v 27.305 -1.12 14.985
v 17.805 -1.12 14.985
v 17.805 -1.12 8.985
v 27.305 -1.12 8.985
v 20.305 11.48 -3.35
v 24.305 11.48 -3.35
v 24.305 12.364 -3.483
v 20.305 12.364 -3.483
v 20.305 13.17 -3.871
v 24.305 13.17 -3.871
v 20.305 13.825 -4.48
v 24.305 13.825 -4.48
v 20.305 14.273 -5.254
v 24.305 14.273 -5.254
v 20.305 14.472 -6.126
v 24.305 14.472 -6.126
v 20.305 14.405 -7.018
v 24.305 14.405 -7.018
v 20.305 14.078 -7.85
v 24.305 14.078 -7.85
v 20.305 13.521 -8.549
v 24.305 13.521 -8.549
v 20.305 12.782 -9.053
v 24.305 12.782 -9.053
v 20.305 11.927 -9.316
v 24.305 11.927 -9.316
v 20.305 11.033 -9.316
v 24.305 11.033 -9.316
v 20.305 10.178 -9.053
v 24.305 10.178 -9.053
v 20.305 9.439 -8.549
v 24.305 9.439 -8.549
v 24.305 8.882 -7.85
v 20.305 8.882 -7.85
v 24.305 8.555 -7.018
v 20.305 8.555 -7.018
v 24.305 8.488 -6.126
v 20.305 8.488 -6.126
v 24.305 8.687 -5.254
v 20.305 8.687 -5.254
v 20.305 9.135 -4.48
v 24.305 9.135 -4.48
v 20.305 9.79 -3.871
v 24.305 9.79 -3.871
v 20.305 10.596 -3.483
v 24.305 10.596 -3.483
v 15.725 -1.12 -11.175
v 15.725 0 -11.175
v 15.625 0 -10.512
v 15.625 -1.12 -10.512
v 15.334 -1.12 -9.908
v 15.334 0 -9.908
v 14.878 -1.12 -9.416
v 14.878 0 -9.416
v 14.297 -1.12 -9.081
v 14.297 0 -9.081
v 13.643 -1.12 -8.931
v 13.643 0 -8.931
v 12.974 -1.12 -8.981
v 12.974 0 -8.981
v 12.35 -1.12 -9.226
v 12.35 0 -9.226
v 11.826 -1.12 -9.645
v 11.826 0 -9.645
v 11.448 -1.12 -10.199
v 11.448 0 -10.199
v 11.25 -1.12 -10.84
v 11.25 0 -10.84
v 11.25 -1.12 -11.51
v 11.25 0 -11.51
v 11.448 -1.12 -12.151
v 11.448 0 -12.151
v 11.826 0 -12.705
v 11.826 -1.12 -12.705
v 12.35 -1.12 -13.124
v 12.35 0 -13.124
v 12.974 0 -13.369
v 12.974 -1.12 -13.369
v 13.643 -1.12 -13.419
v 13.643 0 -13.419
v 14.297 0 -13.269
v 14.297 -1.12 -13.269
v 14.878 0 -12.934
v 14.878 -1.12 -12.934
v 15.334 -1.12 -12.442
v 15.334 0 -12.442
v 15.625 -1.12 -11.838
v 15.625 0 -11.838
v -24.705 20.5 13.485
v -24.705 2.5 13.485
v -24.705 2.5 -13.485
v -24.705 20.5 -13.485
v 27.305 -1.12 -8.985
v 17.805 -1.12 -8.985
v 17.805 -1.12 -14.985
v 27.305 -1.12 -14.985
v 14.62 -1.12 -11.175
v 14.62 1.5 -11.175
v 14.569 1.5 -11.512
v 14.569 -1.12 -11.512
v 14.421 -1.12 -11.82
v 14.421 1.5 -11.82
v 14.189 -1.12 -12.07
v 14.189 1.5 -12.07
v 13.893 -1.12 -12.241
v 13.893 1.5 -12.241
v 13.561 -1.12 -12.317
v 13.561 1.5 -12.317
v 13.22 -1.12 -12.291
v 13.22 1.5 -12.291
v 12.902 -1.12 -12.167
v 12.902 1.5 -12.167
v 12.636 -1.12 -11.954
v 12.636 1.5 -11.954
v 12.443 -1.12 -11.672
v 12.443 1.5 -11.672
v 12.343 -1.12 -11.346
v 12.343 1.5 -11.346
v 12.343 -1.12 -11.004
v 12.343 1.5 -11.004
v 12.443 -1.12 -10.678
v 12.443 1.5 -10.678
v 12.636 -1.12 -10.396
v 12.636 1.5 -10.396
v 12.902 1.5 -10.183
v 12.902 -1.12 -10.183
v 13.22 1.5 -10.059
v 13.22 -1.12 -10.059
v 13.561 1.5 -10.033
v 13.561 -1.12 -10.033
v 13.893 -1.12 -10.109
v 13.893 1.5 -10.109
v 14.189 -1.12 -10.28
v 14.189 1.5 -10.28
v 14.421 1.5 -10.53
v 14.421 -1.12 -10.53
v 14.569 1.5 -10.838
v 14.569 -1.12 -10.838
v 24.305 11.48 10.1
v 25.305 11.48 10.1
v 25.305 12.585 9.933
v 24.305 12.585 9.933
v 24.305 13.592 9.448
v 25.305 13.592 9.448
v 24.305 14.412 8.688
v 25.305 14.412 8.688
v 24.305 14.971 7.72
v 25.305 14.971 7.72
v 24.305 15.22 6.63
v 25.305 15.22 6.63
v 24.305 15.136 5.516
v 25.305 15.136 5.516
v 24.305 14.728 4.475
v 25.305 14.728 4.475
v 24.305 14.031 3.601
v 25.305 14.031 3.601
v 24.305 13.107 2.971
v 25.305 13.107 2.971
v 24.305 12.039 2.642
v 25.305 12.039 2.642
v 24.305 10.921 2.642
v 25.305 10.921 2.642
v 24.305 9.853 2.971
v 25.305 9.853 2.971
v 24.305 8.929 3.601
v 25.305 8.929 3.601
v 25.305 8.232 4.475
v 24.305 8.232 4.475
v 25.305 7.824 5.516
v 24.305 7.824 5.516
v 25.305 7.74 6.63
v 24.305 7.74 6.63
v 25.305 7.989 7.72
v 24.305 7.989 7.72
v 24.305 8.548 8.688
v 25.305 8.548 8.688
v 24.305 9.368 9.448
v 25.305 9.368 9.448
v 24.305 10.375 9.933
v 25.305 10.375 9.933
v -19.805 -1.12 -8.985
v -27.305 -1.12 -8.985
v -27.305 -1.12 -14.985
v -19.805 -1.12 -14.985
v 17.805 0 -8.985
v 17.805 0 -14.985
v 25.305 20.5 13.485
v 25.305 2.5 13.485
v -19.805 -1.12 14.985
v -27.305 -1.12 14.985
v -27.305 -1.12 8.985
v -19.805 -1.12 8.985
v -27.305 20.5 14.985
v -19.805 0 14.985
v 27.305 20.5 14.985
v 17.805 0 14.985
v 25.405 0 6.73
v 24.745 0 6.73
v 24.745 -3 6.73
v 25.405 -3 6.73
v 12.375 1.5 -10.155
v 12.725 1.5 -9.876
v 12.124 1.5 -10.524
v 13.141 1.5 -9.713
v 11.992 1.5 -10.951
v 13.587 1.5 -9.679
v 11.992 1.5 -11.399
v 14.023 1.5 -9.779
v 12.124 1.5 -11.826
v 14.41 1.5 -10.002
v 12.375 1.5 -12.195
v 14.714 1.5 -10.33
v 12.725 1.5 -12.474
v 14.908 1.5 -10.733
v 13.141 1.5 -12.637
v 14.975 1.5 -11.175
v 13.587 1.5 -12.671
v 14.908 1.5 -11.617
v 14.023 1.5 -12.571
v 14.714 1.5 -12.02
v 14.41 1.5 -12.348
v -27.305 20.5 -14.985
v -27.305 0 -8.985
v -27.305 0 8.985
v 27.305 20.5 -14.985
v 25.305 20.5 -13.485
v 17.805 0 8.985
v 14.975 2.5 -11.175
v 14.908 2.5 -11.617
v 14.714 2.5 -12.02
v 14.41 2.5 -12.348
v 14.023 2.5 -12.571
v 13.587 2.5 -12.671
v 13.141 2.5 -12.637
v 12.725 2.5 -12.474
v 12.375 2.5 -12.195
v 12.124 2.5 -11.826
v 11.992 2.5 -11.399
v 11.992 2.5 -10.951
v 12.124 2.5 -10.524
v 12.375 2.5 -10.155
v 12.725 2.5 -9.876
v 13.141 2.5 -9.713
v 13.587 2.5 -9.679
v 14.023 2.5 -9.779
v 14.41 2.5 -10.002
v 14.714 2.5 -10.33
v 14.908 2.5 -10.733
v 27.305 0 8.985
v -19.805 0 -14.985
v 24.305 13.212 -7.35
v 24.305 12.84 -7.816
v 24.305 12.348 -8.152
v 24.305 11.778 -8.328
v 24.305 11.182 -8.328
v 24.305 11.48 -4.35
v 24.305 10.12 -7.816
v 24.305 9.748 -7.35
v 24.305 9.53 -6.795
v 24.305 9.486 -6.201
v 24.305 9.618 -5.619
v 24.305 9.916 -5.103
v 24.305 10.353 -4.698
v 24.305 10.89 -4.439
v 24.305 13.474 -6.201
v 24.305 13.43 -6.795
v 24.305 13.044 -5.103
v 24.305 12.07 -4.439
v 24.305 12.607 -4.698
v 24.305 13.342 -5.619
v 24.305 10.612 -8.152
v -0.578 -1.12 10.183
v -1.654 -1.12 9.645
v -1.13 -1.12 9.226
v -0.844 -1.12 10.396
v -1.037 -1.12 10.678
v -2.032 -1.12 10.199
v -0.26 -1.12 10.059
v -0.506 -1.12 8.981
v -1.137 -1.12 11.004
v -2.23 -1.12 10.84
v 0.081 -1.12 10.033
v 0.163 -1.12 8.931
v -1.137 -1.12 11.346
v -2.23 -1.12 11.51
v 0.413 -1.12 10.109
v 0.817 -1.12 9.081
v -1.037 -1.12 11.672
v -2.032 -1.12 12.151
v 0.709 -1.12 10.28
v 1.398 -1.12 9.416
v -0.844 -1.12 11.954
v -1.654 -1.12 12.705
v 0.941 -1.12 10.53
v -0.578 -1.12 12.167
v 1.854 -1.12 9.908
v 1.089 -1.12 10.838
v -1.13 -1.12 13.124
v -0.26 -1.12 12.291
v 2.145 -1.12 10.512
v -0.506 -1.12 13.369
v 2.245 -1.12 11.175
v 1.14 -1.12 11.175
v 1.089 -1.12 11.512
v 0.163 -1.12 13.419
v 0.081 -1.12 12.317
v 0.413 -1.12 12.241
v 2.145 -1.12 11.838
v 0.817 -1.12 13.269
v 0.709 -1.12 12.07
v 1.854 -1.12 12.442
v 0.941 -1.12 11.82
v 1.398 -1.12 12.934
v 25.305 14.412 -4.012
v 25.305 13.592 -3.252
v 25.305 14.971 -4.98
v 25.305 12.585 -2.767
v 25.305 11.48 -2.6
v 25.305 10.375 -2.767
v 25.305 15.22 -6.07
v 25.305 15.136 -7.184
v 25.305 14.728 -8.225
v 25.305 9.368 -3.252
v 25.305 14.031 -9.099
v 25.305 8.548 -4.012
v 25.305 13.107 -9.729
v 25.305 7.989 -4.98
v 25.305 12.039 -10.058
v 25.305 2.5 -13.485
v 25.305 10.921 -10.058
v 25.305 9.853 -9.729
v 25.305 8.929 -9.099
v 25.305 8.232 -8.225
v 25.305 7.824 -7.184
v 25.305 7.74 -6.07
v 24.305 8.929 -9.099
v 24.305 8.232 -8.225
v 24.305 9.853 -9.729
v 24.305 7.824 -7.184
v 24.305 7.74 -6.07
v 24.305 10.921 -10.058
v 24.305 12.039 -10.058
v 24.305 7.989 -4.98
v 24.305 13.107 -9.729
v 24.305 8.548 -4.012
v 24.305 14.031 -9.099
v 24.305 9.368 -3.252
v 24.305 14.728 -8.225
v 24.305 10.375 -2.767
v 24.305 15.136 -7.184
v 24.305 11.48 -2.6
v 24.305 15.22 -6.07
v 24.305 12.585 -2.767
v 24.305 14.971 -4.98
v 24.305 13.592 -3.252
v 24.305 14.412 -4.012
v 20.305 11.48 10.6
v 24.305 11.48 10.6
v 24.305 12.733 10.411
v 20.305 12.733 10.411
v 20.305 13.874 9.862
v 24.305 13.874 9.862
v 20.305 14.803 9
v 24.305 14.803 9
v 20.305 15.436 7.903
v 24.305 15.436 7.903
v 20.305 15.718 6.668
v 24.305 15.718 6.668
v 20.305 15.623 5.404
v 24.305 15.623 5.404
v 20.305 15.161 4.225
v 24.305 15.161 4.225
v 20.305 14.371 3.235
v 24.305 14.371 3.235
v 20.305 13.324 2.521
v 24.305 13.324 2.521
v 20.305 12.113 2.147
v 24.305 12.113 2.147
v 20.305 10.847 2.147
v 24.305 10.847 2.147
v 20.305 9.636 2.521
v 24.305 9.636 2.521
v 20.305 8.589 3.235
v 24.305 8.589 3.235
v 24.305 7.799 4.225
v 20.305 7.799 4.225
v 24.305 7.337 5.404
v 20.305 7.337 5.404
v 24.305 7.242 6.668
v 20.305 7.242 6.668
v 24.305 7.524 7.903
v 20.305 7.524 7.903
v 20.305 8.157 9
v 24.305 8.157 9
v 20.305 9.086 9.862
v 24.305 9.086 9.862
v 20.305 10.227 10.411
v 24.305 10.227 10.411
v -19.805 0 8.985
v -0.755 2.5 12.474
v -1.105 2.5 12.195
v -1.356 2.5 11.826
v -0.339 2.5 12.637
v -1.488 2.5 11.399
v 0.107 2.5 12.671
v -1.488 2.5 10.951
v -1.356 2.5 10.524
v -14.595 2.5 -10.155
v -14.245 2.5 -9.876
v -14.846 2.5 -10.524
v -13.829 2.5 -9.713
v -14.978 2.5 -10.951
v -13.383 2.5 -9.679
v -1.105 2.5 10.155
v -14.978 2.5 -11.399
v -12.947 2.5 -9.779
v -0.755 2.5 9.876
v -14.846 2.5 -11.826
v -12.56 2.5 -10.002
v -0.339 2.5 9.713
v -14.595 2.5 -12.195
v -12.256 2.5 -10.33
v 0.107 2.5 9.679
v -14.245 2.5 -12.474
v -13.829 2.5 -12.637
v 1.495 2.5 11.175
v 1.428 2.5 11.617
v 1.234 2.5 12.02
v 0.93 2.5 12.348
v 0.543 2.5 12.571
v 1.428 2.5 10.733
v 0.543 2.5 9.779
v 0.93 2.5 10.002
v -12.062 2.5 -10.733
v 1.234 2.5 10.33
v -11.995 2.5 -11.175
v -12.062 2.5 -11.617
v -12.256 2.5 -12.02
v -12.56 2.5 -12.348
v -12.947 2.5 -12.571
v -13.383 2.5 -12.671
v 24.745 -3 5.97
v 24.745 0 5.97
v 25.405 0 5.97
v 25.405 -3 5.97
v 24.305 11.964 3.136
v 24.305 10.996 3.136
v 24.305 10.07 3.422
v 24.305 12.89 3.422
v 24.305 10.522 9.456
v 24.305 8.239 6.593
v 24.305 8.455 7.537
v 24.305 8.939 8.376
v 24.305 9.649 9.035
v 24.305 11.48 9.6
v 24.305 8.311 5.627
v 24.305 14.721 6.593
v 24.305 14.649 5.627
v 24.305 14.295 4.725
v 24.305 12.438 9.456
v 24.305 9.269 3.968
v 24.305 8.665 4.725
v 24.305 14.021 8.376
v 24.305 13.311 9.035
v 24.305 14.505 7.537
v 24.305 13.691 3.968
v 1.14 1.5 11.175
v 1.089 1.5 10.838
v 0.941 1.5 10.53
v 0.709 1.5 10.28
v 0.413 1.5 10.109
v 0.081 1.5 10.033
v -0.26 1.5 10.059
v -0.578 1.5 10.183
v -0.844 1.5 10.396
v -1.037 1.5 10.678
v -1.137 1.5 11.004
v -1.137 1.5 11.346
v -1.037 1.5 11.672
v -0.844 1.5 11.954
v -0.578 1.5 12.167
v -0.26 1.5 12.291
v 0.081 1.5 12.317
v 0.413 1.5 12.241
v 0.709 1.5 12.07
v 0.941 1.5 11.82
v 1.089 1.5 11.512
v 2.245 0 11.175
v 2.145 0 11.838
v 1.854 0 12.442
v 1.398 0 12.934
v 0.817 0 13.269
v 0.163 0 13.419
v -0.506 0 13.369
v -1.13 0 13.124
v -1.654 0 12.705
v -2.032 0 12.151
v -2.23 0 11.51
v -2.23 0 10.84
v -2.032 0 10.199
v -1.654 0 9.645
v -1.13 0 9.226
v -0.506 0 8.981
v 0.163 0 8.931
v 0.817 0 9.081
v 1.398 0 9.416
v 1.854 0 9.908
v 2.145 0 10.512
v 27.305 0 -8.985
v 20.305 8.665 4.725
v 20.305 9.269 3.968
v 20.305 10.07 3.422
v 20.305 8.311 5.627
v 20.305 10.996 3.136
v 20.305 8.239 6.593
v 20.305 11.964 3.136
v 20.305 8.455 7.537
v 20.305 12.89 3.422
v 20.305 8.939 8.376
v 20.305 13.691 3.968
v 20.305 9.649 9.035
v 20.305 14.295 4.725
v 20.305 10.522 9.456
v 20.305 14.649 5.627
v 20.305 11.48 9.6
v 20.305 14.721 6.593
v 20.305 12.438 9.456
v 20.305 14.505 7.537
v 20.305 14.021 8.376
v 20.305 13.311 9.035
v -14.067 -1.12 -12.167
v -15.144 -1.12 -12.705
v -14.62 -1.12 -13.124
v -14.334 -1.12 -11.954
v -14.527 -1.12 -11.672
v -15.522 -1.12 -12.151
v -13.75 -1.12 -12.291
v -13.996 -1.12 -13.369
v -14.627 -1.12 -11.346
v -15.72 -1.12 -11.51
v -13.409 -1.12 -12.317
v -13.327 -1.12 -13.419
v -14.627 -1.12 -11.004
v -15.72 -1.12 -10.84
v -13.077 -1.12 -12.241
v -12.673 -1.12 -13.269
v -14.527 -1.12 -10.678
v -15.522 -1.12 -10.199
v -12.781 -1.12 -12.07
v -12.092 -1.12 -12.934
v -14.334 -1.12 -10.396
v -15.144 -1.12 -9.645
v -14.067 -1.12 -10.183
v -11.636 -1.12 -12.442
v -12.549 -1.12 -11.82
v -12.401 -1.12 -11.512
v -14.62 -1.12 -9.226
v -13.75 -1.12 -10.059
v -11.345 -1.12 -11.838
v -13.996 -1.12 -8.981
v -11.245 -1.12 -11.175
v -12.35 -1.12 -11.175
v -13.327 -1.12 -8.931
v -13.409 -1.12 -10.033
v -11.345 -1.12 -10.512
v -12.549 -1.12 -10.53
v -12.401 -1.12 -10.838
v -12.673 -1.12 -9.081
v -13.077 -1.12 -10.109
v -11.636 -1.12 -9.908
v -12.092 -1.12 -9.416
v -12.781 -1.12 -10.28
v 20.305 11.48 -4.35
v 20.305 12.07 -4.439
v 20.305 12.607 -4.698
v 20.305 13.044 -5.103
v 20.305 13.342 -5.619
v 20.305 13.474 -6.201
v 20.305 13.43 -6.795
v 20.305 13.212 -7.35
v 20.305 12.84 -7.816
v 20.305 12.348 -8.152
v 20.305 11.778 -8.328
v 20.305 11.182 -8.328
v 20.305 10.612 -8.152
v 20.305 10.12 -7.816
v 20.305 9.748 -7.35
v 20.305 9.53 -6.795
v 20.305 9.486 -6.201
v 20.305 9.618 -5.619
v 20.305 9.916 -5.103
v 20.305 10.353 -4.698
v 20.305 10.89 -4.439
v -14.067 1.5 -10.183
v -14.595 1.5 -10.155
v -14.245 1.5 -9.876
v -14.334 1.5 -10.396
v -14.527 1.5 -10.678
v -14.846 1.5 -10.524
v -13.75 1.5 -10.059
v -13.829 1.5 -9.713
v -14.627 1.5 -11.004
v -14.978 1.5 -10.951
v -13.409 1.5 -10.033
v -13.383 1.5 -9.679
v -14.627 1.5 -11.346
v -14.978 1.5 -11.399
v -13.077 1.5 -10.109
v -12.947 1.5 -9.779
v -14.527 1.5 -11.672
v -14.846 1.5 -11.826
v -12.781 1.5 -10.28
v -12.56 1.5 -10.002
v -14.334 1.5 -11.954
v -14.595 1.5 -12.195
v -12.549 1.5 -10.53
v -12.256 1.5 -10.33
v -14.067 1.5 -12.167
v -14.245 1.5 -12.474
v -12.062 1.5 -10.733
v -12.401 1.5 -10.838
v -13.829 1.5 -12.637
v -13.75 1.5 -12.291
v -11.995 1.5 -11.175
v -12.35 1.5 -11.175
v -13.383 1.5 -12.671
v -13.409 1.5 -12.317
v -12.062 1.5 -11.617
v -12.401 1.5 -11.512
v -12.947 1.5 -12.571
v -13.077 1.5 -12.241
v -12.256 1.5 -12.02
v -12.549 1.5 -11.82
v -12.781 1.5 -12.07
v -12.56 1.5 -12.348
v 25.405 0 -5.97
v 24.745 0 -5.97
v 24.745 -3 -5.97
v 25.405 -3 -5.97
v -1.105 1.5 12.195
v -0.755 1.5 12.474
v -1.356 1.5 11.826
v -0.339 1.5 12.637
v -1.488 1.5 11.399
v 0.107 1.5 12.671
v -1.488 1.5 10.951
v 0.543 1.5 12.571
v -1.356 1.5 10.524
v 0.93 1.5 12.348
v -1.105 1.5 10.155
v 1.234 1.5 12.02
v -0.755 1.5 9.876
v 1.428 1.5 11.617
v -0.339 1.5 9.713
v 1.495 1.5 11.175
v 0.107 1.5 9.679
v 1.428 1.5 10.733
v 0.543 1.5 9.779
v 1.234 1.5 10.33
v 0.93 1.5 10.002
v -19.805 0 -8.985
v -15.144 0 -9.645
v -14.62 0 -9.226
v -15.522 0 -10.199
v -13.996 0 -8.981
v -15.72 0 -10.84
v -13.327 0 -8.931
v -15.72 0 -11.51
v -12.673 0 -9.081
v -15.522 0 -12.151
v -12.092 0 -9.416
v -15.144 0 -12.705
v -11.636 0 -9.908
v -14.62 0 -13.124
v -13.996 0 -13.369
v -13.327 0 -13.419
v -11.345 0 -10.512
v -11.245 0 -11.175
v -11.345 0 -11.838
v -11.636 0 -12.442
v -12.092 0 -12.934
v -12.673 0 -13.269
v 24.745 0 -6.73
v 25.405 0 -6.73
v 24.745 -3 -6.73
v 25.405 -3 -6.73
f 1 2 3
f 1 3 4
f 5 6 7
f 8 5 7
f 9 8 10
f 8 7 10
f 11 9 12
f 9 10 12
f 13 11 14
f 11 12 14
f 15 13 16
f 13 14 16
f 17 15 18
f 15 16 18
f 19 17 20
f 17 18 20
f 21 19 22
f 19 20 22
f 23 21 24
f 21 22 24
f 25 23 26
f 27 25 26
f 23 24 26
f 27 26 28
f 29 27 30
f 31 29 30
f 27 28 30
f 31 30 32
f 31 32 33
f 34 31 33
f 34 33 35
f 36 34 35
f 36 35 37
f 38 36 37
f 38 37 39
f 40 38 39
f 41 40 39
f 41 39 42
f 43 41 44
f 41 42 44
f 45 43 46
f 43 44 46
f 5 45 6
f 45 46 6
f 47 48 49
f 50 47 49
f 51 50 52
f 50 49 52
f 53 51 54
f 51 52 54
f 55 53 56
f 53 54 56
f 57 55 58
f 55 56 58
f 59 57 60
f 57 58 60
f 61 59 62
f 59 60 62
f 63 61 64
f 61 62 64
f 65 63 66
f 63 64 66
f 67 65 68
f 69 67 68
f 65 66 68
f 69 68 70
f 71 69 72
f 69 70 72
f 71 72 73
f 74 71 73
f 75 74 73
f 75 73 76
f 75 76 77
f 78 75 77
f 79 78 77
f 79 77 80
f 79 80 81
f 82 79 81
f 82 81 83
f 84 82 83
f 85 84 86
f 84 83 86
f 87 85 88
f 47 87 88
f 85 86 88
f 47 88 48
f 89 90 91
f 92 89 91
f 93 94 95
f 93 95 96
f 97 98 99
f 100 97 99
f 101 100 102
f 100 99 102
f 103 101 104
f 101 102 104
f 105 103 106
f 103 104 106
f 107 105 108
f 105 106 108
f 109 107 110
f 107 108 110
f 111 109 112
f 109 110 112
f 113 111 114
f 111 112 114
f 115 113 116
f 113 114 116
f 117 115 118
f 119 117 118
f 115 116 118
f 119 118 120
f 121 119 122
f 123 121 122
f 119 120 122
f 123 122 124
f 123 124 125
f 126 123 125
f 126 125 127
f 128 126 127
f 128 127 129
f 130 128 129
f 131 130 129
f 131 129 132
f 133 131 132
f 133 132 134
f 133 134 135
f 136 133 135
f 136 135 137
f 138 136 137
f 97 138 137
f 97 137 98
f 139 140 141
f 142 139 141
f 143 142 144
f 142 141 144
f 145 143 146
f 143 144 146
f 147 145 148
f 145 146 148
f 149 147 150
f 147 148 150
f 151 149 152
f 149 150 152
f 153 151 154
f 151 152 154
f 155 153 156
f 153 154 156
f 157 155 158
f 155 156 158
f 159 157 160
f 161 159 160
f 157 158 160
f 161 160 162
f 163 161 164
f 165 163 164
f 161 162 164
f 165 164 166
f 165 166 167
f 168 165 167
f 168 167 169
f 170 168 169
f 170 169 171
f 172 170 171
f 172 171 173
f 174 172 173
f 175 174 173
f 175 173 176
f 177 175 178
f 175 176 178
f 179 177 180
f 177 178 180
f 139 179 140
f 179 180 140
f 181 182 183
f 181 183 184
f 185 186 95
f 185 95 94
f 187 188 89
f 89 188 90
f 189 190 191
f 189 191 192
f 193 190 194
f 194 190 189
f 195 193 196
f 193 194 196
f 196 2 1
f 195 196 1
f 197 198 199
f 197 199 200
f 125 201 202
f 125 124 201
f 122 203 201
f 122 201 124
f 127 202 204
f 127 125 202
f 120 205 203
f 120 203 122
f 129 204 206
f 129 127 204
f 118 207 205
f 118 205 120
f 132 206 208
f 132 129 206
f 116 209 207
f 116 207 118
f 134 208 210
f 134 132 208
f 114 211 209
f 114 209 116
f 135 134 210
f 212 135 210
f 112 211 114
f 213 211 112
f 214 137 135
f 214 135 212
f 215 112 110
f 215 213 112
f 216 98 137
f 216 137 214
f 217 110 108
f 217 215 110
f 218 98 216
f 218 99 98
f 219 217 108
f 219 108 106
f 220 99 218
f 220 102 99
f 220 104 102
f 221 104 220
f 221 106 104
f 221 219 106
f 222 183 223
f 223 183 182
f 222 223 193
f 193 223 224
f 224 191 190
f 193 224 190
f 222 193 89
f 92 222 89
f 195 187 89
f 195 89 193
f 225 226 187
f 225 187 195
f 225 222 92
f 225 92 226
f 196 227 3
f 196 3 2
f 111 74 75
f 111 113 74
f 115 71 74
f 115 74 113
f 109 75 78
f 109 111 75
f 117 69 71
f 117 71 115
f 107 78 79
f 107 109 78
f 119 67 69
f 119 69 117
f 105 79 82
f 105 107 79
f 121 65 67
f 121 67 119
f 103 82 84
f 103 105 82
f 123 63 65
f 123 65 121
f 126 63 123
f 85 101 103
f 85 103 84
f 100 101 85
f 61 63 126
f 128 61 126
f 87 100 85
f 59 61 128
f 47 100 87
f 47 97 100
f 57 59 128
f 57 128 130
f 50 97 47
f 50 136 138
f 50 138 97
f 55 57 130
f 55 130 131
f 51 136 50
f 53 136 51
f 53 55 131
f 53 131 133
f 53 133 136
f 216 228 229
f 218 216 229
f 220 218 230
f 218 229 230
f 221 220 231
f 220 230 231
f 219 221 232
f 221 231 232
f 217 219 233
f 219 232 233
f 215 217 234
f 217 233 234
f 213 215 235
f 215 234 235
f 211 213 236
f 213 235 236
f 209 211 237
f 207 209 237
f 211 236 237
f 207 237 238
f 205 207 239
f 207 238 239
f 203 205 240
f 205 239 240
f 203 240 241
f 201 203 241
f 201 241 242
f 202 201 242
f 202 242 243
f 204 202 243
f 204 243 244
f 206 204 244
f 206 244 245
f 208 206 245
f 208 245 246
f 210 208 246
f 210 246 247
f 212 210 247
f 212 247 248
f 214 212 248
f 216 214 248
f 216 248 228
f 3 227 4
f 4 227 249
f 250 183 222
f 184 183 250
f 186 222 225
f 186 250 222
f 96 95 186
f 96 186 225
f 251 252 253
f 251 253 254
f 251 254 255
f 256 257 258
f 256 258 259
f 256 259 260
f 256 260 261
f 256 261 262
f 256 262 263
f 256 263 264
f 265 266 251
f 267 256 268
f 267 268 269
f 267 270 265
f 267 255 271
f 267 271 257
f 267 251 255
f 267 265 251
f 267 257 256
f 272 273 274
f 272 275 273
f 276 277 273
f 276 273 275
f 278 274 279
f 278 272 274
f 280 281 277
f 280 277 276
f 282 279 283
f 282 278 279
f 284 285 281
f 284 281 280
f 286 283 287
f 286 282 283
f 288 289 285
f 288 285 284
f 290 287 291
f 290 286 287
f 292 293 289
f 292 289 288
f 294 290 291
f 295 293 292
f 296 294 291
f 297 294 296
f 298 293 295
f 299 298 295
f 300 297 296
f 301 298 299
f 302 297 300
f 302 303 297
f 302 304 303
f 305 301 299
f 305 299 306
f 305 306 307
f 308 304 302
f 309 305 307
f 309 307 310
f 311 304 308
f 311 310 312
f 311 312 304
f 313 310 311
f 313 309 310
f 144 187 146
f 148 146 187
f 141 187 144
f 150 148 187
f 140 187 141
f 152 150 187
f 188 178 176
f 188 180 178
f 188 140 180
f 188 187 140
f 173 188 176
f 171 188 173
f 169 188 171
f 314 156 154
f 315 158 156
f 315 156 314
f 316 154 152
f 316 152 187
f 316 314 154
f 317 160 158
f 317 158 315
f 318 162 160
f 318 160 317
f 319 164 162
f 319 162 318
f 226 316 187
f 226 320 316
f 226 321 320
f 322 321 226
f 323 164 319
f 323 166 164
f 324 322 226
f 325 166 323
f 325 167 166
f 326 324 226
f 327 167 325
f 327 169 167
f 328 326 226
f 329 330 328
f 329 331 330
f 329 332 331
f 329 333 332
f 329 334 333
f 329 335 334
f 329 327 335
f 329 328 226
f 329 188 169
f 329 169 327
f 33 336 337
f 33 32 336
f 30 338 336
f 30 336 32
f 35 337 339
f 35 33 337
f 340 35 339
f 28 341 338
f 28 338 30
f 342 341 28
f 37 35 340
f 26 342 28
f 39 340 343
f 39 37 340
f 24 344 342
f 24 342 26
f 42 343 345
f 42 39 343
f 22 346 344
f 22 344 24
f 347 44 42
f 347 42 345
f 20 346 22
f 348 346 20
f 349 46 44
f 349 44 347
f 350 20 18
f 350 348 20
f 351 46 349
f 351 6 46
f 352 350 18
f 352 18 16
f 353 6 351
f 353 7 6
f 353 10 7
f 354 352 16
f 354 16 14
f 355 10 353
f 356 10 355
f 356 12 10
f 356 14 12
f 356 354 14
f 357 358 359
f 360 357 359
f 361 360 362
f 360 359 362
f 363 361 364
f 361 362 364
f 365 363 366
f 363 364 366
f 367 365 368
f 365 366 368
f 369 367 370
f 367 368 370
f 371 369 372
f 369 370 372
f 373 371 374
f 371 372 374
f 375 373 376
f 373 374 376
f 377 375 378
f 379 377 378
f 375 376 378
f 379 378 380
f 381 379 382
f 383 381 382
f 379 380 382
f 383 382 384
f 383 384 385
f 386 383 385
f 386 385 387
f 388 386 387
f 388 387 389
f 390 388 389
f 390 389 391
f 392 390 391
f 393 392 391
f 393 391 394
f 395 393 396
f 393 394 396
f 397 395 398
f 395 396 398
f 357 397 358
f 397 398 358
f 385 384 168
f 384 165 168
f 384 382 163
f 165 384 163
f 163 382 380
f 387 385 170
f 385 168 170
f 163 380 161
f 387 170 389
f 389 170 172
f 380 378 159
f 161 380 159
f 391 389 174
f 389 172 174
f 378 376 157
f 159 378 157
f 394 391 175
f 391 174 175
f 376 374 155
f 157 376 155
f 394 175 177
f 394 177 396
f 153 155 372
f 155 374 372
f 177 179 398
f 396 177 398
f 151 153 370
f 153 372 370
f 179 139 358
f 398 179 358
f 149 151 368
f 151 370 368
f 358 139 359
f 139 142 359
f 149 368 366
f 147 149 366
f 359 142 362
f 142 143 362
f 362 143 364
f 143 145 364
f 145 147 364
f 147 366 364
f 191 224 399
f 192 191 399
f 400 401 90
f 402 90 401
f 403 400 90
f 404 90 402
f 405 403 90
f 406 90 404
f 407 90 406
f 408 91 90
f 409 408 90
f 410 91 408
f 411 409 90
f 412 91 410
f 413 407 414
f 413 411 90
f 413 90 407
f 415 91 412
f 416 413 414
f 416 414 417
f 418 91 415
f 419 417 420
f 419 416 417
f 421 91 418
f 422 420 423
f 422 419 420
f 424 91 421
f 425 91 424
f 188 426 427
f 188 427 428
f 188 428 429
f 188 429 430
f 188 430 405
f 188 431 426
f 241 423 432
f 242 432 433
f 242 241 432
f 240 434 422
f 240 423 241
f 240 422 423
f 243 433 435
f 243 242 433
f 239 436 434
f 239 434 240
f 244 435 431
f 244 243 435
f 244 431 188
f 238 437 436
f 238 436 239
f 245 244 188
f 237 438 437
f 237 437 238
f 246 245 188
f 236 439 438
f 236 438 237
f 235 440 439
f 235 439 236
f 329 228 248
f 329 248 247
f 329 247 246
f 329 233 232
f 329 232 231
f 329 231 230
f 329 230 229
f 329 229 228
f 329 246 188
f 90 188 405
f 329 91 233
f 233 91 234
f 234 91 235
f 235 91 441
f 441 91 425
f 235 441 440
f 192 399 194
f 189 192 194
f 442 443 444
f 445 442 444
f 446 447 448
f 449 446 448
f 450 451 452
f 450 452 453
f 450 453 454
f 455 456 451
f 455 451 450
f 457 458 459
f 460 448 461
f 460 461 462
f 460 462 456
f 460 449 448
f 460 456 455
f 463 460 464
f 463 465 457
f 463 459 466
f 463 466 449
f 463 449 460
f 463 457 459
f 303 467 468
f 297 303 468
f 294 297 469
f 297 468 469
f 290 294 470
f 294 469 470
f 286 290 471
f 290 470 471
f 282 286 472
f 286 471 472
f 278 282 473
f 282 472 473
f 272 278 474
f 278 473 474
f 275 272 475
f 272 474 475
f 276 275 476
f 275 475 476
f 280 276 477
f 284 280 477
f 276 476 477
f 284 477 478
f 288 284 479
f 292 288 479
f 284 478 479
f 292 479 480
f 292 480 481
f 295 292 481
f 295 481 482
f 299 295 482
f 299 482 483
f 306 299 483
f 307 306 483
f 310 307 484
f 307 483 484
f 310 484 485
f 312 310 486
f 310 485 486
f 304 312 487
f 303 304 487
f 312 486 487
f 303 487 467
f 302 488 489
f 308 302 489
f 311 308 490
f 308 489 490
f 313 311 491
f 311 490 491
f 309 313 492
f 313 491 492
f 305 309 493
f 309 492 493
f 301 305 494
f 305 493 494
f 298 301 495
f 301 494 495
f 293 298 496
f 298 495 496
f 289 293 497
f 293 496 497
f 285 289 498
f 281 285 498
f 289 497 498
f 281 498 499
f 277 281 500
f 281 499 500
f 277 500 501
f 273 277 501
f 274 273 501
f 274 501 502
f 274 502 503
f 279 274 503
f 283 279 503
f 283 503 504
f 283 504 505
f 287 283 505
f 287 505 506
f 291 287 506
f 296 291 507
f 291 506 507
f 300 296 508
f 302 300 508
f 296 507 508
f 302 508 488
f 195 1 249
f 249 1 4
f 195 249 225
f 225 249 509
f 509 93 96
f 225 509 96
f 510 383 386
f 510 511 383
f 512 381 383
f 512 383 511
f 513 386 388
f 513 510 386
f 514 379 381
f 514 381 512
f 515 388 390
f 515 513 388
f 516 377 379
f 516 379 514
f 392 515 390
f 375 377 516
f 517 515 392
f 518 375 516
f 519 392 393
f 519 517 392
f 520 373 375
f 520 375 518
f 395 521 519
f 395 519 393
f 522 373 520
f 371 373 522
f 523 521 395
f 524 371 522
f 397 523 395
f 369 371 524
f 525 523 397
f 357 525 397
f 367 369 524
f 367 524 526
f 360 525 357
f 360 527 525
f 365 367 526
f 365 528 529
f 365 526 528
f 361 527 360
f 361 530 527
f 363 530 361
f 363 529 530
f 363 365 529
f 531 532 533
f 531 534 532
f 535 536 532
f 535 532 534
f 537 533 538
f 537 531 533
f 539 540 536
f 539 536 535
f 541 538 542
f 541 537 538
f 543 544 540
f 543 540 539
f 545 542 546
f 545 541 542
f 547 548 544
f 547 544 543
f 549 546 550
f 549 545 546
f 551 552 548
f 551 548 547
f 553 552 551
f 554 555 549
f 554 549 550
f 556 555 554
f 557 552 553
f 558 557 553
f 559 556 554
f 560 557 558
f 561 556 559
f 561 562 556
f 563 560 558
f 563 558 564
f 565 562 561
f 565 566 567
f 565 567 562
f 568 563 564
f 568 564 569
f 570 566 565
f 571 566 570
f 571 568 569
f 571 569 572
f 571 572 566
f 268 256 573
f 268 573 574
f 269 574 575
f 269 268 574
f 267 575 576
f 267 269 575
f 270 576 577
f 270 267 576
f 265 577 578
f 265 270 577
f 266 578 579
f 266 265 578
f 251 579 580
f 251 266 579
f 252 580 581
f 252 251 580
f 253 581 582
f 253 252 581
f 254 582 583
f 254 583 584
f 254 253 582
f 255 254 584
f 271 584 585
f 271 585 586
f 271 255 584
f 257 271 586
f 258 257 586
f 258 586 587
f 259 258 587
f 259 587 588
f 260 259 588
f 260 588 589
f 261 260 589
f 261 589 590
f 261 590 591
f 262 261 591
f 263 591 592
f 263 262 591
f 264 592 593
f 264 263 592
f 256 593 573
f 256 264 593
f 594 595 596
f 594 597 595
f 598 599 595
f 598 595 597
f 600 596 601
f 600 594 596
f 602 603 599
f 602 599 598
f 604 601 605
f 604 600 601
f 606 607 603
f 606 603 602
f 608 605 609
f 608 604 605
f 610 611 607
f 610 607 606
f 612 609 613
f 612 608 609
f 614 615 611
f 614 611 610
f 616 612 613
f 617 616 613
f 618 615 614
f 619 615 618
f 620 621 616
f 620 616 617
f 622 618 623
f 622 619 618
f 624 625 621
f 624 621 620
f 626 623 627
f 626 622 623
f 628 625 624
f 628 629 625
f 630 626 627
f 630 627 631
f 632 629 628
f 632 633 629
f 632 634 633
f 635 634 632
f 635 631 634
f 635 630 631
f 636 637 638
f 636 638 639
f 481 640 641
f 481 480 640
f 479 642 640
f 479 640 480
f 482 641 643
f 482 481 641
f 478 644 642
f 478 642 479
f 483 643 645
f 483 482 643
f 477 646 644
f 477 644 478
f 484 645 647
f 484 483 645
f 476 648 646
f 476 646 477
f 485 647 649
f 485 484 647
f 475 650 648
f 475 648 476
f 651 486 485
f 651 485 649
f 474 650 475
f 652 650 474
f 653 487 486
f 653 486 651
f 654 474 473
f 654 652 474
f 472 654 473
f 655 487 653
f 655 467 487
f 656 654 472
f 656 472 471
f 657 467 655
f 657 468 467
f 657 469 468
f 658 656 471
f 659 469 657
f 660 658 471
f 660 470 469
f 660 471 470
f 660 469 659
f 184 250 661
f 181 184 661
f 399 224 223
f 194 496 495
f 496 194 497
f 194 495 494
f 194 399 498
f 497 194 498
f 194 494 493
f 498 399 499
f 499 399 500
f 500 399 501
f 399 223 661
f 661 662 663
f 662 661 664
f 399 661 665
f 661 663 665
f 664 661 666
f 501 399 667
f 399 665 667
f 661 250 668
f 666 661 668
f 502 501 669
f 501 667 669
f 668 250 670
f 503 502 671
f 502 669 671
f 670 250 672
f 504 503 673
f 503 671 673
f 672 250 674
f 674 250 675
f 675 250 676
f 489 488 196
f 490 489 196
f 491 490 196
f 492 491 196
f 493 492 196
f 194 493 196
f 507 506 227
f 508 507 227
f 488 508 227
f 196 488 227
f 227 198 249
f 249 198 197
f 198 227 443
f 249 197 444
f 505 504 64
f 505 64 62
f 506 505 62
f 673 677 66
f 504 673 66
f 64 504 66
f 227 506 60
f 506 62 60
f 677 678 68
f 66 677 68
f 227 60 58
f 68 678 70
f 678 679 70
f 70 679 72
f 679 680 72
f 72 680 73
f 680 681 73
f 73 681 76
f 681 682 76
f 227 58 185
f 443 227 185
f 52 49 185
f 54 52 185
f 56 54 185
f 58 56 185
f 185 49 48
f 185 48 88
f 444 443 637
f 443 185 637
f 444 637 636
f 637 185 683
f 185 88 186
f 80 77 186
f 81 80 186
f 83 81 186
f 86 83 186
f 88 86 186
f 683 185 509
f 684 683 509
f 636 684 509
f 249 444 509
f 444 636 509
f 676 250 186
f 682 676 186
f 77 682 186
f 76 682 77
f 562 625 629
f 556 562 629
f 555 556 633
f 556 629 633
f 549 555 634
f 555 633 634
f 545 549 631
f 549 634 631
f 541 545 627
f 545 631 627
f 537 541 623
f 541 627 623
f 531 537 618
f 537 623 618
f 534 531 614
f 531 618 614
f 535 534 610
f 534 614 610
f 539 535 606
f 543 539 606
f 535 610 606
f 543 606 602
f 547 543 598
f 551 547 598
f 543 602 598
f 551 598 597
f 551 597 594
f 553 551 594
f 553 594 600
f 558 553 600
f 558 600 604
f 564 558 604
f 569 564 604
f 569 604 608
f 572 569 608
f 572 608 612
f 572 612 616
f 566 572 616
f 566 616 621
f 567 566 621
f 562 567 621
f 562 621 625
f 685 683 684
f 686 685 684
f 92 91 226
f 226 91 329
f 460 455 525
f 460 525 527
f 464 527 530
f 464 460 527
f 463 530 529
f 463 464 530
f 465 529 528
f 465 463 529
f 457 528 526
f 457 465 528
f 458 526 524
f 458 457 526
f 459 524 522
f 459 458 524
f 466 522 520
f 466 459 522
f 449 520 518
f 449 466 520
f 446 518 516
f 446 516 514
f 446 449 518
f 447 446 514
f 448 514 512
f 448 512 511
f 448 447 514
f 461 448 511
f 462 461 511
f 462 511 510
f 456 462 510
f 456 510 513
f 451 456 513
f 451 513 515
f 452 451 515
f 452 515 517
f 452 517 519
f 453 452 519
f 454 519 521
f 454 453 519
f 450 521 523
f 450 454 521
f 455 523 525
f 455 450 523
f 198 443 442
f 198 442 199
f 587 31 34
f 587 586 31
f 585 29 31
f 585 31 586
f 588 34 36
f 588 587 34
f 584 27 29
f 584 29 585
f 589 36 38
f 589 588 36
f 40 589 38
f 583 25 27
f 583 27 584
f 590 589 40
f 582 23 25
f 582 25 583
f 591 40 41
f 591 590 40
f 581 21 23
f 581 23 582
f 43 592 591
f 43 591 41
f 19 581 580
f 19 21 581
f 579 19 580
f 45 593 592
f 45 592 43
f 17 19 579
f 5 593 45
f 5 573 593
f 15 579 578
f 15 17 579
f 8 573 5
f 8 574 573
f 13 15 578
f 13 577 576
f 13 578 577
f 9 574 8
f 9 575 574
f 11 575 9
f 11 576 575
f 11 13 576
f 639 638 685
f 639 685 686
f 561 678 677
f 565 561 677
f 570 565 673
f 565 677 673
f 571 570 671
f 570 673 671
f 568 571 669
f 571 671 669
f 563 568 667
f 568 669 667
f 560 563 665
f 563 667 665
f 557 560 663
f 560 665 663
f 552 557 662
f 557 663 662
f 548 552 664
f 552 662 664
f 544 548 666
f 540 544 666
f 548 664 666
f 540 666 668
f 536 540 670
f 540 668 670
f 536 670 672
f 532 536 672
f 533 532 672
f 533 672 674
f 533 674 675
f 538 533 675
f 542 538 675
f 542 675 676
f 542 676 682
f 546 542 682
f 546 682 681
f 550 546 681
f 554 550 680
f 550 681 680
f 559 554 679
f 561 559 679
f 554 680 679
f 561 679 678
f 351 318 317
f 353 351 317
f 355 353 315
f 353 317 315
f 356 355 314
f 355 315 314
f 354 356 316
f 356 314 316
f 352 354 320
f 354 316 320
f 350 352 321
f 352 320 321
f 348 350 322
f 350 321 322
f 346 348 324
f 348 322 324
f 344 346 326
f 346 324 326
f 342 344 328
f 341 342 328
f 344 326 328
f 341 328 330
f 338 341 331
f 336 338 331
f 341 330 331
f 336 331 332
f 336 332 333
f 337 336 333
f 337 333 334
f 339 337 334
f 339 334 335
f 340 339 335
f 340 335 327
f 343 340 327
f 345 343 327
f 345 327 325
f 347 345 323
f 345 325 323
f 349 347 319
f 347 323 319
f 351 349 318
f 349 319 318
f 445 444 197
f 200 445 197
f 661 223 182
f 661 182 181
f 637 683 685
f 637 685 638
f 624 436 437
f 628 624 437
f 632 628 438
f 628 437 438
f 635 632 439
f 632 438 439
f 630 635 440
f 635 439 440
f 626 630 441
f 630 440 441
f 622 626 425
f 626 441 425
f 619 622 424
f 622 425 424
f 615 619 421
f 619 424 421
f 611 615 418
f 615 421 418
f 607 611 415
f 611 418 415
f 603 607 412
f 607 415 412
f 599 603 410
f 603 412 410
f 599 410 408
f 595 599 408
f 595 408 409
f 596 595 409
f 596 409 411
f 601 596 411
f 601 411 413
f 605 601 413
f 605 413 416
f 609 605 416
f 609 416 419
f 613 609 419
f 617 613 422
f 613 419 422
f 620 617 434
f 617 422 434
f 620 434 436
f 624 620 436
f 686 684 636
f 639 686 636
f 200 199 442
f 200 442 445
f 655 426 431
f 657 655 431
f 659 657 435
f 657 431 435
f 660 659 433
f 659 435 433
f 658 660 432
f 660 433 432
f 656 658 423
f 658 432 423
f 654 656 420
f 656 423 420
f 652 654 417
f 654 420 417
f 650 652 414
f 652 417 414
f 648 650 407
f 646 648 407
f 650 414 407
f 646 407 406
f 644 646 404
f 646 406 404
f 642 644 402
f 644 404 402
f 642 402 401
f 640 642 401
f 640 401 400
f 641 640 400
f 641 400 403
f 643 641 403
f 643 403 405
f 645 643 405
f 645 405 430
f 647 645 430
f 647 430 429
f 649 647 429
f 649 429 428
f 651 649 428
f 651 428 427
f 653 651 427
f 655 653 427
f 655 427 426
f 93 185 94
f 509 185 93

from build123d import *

# Parameters (mm, degrees)
SKETCH_1_W          = 54.61
SKETCH_1_H          = 29.97
EXTRUDE_1_DEPTH     = 2.5
EXTRUDE_2_DEPTH     = 17
CUT_EXTRUDE_1_DEPTH = 30.97
SKETCH_4_R          = 1.145
CUT_EXTRUDE_2_DEPTH = 3.5
SKETCH_5_R          = 2.25
SKETCH_5_W          = 7.5
SKETCH_5_H          = 6
SKETCH_5_W_2        = 9.5
EXTRUDE_3_DEPTH     = 1.12
SKETCH_6_R          = 1.145
CUT_EXTRUDE_3_DEPTH = 4.62
SKETCH_7_R          = 1.5
CUT_EXTRUDE_4_DEPTH = 1
SKETCH_9_W          = 0.66
SKETCH_9_H          = 0.76
EXTRUDE_5_DEPTH     = 3
SKETCH_10_R         = 3.75
EXTRUDE_6_DEPTH     = 1
SKETCH_11_R         = 3
SKETCH_11_R_2       = 2
EXTRUDE_7_DEPTH     = 4
SKETCH_12_R         = 4.25
SKETCH_12_R_2       = 3.25
EXTRUDE_8_DEPTH     = 4
SKETCH5_W           = 26
SKETCH5_H           = 4
CUT_EXTRUDE4_DEPTH  = 17
BOSS_EXTRUDE1_DEPTH = 18
SKETCH7_W           = 2
SKETCH7_H           = 29.97
BOSS_EXTRUDE2_DEPTH = 1


with BuildPart() as part:
    # Эскиз1 → Бобышка-Вытянуть1 (new body)
    with BuildSketch(Plane(origin=(0, 0, 0), x_dir=(1, 0, 0), z_dir=(0, 1, 0))):
        Rectangle(SKETCH_1_W, SKETCH_1_H)
    extrude(amount=EXTRUDE_1_DEPTH)

    # Эскиз2 → Бобышка-Вытянуть2 (add)
    with BuildSketch(Plane(origin=(0, 2.5, 0), x_dir=(1, 0, 0), z_dir=(0, 1, 0))):
        with BuildLine():
            Line((27.305, -14.985), (-0.695, -14.985))
            Line((-0.695, -14.985), (-0.695, -13.485))
            Line((-0.695, -13.485), (23.305, -13.485))
            ThreePointArc((23.305, -13.485), (24.719213562, -12.899213562), (25.305, -11.485))
            Line((25.305, -11.485), (25.305, 11.485))
            ThreePointArc((25.305, 11.485), (24.719213562, 12.899213562), (23.305, 13.485))
            Line((23.305, 13.485), (-0.695, 13.485))
            Line((-0.695, 13.485), (-0.695, 14.985))
            Line((-0.695, 14.985), (27.305, 14.985))
            Line((27.305, 14.985), (27.305, -14.985))
        make_face()
    extrude(amount=EXTRUDE_2_DEPTH)

    # Эскиз3 → Вырез-Вытянуть1 (cut, through all)
    with BuildSketch(Plane.XY.offset(14.985)):
        Polygon((-0.695, 2.5), (25.305, 19.5), (-0.695, 19.5), align=None)
    extrude(amount=-CUT_EXTRUDE_1_DEPTH, mode=Mode.SUBTRACT)

    # Эскиз4 → Вырез-Вытянуть2 (cut, through all)
    with BuildSketch(Plane(origin=(0, 2.5, 0), x_dir=(1, 0, 0), z_dir=(0, 1, 0))):
        with Locations((-13.495, 11.175)):
            Circle(SKETCH_4_R)
        with Locations((-0.005, -11.175)):
            Circle(SKETCH_4_R)
        with Locations((13.475, 11.175)):
            Circle(SKETCH_4_R)
    extrude(amount=-CUT_EXTRUDE_2_DEPTH, mode=Mode.SUBTRACT)

    # Эскиз5 → Бобышка-Вытянуть3 (add)
    with BuildSketch(Plane.XZ):
        with Locations((-0.005, 11.175)):
            Circle(SKETCH_5_R)
        with Locations((13.475, -11.175)):
            Circle(SKETCH_5_R)
        with Locations((-13.495, -11.175)):
            Circle(SKETCH_5_R)
        with Locations((-23.555, 11.985)):
            Rectangle(SKETCH_5_W, SKETCH_5_H)
        with Locations((22.555, 11.985)):
            Rectangle(SKETCH_5_W_2, SKETCH_5_H)
        with Locations((22.555, -11.985)):
            Rectangle(SKETCH_5_W_2, SKETCH_5_H)
        with Locations((-23.555, -11.985)):
            Rectangle(SKETCH_5_W, SKETCH_5_H)
    extrude(amount=EXTRUDE_3_DEPTH)

    # Эскиз6 → Вырез-Вытянуть3 (cut, through all)
    with BuildSketch(Plane(origin=(0, 2.5, 0), x_dir=(1, 0, 0), z_dir=(0, 1, 0))):
        with Locations((-13.495, 11.175)):
            Circle(SKETCH_6_R)
        with Locations((13.475, 11.175)):
            Circle(SKETCH_6_R)
        with Locations((-0.005, -11.175)):
            Circle(SKETCH_6_R)
    extrude(amount=-CUT_EXTRUDE_3_DEPTH, mode=Mode.SUBTRACT)

    # Эскиз7 → Вырез-Вытянуть4 (cut)
    with BuildSketch(Plane(origin=(0, 2.5, 0), x_dir=(1, 0, 0), z_dir=(0, 1, 0))):
        with Locations((-13.495, 11.175)):
            Circle(SKETCH_7_R)
        with Locations((13.475, 11.175)):
            Circle(SKETCH_7_R)
        with Locations((-0.005, -11.175)):
            Circle(SKETCH_7_R)
    extrude(amount=-CUT_EXTRUDE_4_DEPTH, mode=Mode.SUBTRACT)

    # Эскиз9 → Бобышка-Вытянуть5 (add)
    with BuildSketch(Plane.XZ):
        with Locations((25.075, 6.35)):
            Rectangle(SKETCH_9_W, SKETCH_9_H)
        with Locations((25.075, -6.35)):
            Rectangle(SKETCH_9_W, SKETCH_9_H)
    extrude(amount=EXTRUDE_5_DEPTH)

    # Эскиз10 → Бобышка-Вытянуть6 (add)
    with BuildSketch(Plane.ZY.offset(-25.305)):
        with Locations((-6.35, 11.48)):
            Circle(SKETCH_10_R)
        with Locations((6.35, 11.48)):
            Circle(SKETCH_10_R)
    extrude(amount=EXTRUDE_6_DEPTH)

    # Эскиз11 → Бобышка-Вытянуть7 (add)
    with BuildSketch(Plane.ZY.offset(-24.305)):
        with Locations((-6.35, 11.48)):
            Circle(SKETCH_11_R)
        with Locations((-6.35, 11.48)):
            Circle(SKETCH_11_R_2, mode=Mode.SUBTRACT)
    extrude(amount=EXTRUDE_7_DEPTH)

    # Эскиз12 → Бобышка-Вытянуть8 (add)
    with BuildSketch(Plane.ZY.offset(-24.305)):
        with Locations((6.35, 11.48)):
            Circle(SKETCH_12_R)
        with Locations((6.35, 11.48)):
            Circle(SKETCH_12_R_2, mode=Mode.SUBTRACT)
    extrude(amount=EXTRUDE_8_DEPTH)

    # Sketch5 → Cut-Extrude4 (cut)
    with BuildSketch(Plane(origin=(0, 19.5, 0), x_dir=(1, 0, 0), z_dir=(0, 1, 0))):
        with Locations((12.305, -12.985)):
            Rectangle(SKETCH5_W, SKETCH5_H)
        with Locations((12.305, 12.985)):
            Rectangle(SKETCH5_W, SKETCH5_H)
    extrude(amount=-CUT_EXTRUDE4_DEPTH, mode=Mode.SUBTRACT)

    # Sketch6 → Boss-Extrude1 (add)
    with BuildSketch(Plane(origin=(0, 2.5, 0), x_dir=(1, 0, 0), z_dir=(0, 1, 0))):
        Polygon((25.305, 13.485), (25.305, 14.985), (-27.305, 14.985), (-27.305, -14.985), (25.305, -14.985), (25.305, -13.485), (-24.705, -13.485), (-24.705, 13.485), align=None)
    extrude(amount=BOSS_EXTRUDE1_DEPTH)

    # Sketch7 → Boss-Extrude2 (add)
    with BuildSketch(Plane(origin=(0, 19.5, 0), x_dir=(1, 0, 0), z_dir=(0, 1, 0))):
        with Locations((26.305, 0)):
            Rectangle(SKETCH7_W, SKETCH7_H)
    extrude(amount=BOSS_EXTRUDE2_DEPTH)


solid = part.part
